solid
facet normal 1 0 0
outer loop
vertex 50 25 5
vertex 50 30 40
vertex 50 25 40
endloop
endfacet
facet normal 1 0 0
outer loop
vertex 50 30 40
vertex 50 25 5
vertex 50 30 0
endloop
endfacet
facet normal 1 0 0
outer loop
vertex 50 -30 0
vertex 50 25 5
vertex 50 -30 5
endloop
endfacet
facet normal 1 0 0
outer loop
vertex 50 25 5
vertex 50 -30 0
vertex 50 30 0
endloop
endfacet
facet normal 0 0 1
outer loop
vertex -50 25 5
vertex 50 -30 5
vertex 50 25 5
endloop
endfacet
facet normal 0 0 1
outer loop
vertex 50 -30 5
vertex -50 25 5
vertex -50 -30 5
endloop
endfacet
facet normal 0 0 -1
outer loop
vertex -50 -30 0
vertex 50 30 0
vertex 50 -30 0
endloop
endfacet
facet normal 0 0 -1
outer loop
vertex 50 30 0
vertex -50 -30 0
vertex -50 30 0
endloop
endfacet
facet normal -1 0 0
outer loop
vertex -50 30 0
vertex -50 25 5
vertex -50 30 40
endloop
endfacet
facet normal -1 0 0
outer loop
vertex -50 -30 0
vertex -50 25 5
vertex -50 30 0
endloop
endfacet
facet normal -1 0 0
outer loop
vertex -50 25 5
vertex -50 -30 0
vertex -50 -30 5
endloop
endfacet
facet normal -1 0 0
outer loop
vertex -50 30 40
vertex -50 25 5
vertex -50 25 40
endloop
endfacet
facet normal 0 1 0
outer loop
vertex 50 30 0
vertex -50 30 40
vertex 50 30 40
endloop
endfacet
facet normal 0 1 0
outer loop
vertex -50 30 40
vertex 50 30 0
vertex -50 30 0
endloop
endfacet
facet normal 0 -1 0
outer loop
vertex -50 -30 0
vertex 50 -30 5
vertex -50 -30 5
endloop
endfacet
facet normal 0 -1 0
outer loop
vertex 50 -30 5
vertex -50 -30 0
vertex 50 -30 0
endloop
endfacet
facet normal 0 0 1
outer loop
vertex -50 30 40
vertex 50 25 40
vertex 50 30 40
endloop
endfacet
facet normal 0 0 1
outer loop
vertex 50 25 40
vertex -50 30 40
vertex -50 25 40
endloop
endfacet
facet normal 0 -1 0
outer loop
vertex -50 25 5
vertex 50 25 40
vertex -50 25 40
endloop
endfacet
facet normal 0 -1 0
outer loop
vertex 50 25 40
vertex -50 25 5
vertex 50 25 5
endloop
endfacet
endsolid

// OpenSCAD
// Coordinate reference for task-038. Preserve this bracket while adding ribs:
// base x=[-50,50], y=[-30,30], z=[0,5]
// upright x=[-50,50], y=[25,30], z=[5,40]
$fn = 64;

union() {
	translate(v = [-50.0, -30.0, 0]) {
		cube(size = [100, 60, 5]);
	}
	translate(v = [-50, 25, 5]) {
		cube(size = [100, 5, 35]);
	}
}
